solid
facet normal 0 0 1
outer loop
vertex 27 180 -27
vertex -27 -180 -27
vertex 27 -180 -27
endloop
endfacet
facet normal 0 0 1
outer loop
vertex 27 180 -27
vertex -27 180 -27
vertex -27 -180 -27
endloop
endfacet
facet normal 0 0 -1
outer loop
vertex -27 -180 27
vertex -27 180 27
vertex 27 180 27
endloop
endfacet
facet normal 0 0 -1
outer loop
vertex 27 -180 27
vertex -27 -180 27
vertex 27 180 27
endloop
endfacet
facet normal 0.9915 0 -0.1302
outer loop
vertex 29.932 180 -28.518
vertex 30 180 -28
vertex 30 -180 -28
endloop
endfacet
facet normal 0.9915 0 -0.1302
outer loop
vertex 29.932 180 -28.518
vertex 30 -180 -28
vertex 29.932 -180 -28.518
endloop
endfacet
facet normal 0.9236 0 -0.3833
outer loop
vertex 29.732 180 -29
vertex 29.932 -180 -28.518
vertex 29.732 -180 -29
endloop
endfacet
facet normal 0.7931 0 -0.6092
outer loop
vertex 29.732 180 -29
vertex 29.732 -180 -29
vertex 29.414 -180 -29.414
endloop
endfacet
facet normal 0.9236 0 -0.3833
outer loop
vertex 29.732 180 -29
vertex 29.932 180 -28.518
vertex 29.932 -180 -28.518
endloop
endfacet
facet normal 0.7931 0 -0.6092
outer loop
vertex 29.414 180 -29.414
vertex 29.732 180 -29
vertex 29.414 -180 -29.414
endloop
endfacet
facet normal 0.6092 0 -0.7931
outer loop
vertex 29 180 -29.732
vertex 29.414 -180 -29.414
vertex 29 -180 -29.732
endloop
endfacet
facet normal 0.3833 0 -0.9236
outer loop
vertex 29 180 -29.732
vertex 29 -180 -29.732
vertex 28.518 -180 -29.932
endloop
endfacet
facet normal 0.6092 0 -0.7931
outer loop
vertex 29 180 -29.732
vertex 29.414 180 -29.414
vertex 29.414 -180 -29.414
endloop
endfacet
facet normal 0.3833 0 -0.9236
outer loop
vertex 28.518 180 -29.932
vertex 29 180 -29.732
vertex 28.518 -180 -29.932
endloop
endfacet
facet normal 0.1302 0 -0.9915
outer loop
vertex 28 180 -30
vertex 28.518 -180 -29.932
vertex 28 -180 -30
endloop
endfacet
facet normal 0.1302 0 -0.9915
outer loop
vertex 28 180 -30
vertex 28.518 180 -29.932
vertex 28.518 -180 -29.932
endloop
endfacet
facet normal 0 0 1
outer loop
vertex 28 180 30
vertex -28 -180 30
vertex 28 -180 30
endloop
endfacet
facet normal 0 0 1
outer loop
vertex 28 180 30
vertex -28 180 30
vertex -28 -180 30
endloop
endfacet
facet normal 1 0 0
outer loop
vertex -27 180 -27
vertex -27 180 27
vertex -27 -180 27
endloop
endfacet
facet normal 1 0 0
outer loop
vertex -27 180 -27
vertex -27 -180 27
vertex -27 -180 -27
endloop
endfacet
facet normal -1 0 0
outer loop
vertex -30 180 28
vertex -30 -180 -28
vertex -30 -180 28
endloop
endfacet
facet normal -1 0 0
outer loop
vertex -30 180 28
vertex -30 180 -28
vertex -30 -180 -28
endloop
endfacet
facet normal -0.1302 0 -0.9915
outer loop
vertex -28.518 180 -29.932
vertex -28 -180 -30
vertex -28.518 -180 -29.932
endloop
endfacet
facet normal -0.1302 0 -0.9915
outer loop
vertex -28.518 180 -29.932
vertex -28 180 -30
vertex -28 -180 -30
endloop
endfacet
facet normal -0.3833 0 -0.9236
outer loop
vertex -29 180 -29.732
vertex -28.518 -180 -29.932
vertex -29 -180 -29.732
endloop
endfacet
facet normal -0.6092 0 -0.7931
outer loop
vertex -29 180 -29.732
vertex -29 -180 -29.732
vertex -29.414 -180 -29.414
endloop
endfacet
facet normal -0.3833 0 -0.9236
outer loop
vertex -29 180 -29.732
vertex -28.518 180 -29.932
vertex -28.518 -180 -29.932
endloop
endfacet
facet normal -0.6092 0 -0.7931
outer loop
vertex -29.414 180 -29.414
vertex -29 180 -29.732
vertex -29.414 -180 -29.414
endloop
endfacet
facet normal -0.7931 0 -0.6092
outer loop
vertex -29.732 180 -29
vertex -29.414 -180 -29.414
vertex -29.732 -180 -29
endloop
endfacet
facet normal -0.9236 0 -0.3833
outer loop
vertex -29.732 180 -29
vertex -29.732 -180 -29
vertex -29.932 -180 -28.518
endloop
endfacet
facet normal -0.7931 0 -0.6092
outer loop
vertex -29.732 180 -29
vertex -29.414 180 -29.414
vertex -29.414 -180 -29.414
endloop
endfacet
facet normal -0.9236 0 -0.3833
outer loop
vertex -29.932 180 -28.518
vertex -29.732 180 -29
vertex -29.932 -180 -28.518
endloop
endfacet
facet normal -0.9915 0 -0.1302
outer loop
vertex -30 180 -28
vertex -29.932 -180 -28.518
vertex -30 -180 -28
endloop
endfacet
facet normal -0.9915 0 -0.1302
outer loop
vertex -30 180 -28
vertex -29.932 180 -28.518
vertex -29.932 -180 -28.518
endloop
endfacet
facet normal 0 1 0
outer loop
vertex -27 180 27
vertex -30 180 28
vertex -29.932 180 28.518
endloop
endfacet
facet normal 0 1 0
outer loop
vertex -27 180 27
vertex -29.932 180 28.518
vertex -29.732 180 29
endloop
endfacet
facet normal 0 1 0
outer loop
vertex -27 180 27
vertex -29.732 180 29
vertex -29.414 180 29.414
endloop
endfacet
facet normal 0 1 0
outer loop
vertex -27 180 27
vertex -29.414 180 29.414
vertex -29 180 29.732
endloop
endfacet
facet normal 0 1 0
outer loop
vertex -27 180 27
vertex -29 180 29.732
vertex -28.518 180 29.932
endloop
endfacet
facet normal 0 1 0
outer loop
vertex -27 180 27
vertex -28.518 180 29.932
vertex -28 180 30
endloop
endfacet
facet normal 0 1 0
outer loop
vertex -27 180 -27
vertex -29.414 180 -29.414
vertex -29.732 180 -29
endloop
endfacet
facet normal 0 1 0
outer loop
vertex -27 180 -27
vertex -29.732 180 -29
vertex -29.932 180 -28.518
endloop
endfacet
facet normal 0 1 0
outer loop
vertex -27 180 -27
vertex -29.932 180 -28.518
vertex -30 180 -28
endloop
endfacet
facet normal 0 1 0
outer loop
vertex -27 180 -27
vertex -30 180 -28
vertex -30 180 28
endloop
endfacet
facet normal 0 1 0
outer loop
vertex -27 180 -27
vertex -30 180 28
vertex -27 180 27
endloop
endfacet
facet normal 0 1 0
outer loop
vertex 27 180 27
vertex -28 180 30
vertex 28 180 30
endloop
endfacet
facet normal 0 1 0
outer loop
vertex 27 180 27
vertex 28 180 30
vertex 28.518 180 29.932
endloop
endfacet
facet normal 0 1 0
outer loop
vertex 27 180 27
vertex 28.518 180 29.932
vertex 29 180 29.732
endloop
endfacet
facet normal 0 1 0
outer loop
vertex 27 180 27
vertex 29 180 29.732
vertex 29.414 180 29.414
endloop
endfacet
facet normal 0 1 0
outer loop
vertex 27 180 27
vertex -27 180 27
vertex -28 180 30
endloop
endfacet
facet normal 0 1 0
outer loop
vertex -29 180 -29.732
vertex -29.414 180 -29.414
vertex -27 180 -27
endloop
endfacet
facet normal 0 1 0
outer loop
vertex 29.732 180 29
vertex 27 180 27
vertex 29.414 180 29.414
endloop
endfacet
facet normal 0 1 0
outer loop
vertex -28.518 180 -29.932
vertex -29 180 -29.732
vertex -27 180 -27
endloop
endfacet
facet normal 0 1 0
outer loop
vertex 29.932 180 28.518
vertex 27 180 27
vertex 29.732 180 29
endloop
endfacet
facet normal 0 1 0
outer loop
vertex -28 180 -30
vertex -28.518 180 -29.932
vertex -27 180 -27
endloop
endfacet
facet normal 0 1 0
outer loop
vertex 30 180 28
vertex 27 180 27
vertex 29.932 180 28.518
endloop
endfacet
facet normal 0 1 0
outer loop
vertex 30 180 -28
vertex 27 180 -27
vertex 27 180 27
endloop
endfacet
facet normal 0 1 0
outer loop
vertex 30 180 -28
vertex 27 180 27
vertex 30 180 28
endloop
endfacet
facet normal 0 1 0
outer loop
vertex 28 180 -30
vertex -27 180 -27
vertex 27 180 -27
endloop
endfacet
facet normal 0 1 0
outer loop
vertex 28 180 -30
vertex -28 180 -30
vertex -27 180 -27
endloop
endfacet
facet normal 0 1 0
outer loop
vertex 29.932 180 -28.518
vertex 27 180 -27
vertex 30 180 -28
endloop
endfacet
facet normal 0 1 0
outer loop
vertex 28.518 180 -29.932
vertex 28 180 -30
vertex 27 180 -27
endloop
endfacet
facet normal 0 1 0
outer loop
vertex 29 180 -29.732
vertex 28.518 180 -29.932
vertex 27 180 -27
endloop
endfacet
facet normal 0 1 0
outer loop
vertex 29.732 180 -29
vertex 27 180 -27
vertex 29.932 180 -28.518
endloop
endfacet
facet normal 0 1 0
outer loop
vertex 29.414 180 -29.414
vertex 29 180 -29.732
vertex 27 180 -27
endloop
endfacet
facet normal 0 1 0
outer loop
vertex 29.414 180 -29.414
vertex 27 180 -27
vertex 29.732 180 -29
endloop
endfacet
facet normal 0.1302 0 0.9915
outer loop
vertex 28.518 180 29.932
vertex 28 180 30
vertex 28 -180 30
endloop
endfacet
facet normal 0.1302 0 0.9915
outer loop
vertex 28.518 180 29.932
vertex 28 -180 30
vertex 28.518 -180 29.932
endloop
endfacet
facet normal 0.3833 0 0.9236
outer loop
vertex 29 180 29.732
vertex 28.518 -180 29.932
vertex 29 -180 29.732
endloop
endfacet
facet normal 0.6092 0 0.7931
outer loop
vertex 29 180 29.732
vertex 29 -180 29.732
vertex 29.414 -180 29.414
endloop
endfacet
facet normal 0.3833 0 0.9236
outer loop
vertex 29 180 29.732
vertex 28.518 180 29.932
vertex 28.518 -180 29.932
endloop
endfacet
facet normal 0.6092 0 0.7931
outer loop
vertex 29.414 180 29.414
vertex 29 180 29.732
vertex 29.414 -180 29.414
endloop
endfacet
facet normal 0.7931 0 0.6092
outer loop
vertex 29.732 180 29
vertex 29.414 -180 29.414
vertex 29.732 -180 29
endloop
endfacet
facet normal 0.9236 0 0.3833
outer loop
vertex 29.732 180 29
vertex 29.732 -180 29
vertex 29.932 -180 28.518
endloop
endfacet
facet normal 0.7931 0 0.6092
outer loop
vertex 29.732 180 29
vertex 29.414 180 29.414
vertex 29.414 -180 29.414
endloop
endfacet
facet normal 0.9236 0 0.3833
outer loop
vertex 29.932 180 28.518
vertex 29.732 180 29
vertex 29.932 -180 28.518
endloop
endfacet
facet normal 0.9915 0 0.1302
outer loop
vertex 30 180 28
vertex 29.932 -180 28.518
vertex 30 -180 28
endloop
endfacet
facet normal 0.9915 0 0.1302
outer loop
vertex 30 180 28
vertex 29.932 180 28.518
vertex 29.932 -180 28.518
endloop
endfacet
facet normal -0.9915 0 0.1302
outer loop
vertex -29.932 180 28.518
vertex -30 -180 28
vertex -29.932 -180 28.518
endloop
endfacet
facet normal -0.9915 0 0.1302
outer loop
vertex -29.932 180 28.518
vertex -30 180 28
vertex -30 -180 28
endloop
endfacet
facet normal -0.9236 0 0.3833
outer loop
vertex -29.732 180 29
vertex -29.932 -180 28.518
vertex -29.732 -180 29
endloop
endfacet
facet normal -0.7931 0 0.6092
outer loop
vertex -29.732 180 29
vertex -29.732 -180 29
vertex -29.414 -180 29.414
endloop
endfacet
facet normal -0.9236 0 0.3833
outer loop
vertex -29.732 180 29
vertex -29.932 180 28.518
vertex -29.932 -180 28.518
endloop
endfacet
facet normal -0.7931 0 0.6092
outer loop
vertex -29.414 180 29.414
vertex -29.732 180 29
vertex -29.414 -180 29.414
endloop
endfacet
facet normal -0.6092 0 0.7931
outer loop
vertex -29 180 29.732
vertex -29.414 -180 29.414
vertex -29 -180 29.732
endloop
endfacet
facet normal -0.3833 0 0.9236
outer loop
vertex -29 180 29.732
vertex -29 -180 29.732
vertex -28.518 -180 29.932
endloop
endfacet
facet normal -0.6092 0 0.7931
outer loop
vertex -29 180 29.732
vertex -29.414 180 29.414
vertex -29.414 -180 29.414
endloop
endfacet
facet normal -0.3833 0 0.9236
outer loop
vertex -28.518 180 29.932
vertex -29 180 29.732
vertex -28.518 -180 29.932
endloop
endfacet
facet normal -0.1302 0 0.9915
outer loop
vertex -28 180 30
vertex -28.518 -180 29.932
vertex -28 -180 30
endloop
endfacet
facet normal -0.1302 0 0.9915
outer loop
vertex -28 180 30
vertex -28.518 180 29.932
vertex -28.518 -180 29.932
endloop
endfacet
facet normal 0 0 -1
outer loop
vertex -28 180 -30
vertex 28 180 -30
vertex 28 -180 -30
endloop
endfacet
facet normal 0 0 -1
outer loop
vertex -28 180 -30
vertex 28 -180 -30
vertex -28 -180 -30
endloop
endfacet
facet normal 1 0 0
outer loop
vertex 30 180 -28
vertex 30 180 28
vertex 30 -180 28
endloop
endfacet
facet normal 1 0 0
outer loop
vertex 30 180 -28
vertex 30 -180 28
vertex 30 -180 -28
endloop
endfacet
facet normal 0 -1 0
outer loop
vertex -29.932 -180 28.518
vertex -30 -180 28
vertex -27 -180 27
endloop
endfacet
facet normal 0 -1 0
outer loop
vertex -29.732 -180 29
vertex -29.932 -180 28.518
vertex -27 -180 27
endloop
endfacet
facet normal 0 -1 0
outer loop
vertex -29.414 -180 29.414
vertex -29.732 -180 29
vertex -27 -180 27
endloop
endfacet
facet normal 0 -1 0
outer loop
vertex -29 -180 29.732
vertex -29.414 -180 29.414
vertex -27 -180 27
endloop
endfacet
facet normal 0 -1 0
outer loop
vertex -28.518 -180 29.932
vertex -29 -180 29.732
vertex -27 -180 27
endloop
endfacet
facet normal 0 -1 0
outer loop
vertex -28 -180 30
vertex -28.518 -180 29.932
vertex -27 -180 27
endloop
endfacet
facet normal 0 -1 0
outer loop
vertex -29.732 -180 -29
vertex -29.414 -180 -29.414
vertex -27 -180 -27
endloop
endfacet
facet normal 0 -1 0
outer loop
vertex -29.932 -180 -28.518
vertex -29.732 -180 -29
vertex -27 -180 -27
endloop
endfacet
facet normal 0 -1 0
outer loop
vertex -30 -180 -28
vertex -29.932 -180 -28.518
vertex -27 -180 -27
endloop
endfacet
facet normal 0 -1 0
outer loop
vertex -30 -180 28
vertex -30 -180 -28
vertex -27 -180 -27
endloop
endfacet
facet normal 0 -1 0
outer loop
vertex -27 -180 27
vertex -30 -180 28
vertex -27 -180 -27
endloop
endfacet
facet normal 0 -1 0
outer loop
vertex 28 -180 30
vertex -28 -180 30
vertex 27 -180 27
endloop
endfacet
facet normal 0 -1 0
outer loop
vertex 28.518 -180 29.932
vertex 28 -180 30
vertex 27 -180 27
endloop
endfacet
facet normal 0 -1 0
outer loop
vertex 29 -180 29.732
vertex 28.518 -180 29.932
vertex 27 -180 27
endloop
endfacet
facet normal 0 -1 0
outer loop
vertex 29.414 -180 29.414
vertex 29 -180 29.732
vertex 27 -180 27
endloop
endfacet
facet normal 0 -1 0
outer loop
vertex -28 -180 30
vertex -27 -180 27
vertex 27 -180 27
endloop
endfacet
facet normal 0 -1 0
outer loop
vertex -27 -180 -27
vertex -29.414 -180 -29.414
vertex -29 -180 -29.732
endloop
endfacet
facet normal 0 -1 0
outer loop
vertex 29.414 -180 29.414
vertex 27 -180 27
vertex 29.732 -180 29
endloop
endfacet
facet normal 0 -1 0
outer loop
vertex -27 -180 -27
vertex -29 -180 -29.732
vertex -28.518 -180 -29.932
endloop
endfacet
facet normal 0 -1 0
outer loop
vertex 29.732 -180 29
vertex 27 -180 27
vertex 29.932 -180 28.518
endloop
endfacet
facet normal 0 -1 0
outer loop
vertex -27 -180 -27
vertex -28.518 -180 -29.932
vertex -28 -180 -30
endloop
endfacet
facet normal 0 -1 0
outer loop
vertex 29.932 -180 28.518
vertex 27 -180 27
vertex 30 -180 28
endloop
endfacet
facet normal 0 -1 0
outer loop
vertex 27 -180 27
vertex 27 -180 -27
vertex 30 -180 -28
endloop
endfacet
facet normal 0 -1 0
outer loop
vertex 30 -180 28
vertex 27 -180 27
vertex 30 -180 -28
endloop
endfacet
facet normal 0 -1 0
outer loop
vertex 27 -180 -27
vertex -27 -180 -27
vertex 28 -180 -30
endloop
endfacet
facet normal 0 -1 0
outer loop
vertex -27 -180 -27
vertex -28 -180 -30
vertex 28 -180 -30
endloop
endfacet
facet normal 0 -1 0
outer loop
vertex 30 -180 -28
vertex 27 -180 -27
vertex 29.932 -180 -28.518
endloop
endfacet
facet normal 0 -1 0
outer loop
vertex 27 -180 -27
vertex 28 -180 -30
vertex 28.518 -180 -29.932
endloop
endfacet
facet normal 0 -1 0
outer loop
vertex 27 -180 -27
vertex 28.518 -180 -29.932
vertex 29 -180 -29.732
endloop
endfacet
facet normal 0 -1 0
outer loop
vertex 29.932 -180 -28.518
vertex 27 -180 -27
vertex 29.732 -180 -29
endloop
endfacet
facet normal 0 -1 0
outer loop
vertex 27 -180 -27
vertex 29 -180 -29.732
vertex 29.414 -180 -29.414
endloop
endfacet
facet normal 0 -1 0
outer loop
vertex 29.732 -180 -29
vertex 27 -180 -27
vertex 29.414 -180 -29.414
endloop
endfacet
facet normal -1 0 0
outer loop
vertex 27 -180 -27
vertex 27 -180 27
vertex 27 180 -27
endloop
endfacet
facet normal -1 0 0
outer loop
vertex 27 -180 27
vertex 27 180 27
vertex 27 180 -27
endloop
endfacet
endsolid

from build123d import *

# Parameters (mm, degrees)
ESBO_O1_W                = 54
ESBO_O1_H                = 54
RESSALTO_EXTRUS_O1_DEPTH = 180


with BuildPart() as part:
    # Esboço1 → Ressalto-extrusão1 (new, symmetric)
    with BuildSketch(Plane(origin=(0, 0, 0), x_dir=(1, 0, 0), z_dir=(0, 1, 0))):
        with BuildLine():
            Line((-28, -30), (28, -30))
            ThreePointArc((28, -30), (29.414213562, -29.414213562), (30, -28))
            Line((30, -28), (30, 28))
            ThreePointArc((30, 28), (29.414213562, 29.414213562), (28, 30))
            Line((28, 30), (-28, 30))
            ThreePointArc((-28, 30), (-29.414213562, 29.414213562), (-30, 28))
            Line((-30, 28), (-30, -28))
            ThreePointArc((-30, -28), (-29.414213562, -29.414213562), (-28, -30))
        make_face()
        Rectangle(ESBO_O1_W, ESBO_O1_H, mode=Mode.SUBTRACT)
    extrude(amount=RESSALTO_EXTRUS_O1_DEPTH, both=True)


solid = part.part
